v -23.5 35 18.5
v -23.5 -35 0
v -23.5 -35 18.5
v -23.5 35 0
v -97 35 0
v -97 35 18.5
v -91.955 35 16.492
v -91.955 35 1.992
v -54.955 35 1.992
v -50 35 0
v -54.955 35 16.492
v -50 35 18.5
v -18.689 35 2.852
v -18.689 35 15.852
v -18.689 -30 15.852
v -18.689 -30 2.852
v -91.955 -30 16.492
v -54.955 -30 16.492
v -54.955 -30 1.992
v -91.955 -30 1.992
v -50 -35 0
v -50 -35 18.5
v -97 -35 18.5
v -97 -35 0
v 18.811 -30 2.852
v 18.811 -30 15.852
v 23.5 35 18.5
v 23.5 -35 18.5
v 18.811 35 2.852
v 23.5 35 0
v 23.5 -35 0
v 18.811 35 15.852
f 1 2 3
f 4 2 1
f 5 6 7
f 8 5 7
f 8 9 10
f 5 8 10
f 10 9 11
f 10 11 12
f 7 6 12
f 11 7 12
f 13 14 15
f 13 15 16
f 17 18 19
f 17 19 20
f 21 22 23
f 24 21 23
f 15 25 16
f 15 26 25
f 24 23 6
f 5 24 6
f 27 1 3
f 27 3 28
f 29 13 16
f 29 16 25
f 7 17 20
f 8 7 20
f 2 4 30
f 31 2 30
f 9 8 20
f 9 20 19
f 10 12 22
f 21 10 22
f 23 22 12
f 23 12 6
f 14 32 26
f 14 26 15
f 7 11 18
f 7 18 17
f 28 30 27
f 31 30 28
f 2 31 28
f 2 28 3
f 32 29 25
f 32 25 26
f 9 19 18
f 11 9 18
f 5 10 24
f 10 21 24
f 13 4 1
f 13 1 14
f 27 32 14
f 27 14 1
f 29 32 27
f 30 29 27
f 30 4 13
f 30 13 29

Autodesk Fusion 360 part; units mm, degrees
sketch "Sketch1" plane through (0, 0, 0) normal (0, 0, 1) x (1, 0, 0)
  line L0 (23.5, -35) -> (-23.5, -35)
  line L1 (-23.5, -35) -> (-23.5, 35)
  line L2 (-23.5, 35) -> (23.5, 35)
  line L3 (23.5, 35) -> (23.5, -35)
  line L4 (23.5, -35) -> (-23.5, 35) construction
  line L5 (-23.5, -35) -> (23.5, 35) construction
  dimension "d1" = 70
  dimension "d2" = 47
extrude "Extrude1" add sketch "Sketch1" along normal blind 18.5 makes body 1
sketch "Sketch2" plane through (0, 35, 0) normal (0, 1, 0) x (-1, 0, 0)
  line L0 (-23.5, 0) -> (23.5, 0)
  line L1 (23.5, 0) -> (23.5, 18.5)
  line L2 (23.5, 18.5) -> (-23.5, 18.5)
  line L3 (-23.5, 18.5) -> (-23.5, 0)
  line L4 (18.6888, 2.8525) -> (-18.8112, 2.8525)
  line L5 (-18.8112, 2.8525) -> (-18.8112, 15.8525)
  line L6 (-18.8112, 15.8525) -> (18.6888, 15.8525)
  line L7 (18.6888, 15.8525) -> (18.6888, 2.8525)
  dimension "d5" = 13
  dimension "d6" = 37.5
extrude "Extrude2" cut sketch "Sketch2" against normal blind 65 contours L4 L5 L6 L7 bodies 1
sketch "Sketch3" plane through (0, 0, 18.5) normal (0, 0, 1) x (-1, 0, 0)
  line L0 (-23.5, -35) -> (23.5, -35)
  line L1 (23.5, -35) -> (23.5, 35)
  line L2 (23.5, 35) -> (-23.5, 35)
  line L3 (-23.5, 35) -> (-23.5, -35)
  line L4 (97, -35) -> (50, -35)
  line L5 (50, -35) -> (50, 35)
  line L6 (50, 35) -> (97, 35)
  line L7 (97, 35) -> (97, -35)
  dimension "d9" = 47
  dimension "d10" = 70
extrude "Extrude3" add sketch "Sketch3" against normal blind 18.5 separate body contours L4 L5 L6 L7 makes body 2
sketch "Sketch5" plane through (0, 35, 0) normal (0, 1, 0) x (-1, 0, 0)
  line L0 (97, 18.5) -> (50, 18.5)
  line L1 (50, 18.5) -> (50, 0)
  line L2 (50, 0) -> (97, 0)
  line L3 (97, 0) -> (97, 18.5)
  line L4 (54.9552, 16.4924) -> (91.9552, 16.4924)
  line L5 (91.9552, 16.4924) -> (91.9552, 1.9924)
  line L6 (91.9552, 1.9924) -> (54.9552, 1.9924)
  line L7 (54.9552, 1.9924) -> (54.9552, 16.4924)
  dimension "d13" = 37
  dimension "d14" = 14.5
extrude "Extrude4" cut sketch "Sketch5" against normal blind 65 contours L4 L5 L6 L7 bodies 2
